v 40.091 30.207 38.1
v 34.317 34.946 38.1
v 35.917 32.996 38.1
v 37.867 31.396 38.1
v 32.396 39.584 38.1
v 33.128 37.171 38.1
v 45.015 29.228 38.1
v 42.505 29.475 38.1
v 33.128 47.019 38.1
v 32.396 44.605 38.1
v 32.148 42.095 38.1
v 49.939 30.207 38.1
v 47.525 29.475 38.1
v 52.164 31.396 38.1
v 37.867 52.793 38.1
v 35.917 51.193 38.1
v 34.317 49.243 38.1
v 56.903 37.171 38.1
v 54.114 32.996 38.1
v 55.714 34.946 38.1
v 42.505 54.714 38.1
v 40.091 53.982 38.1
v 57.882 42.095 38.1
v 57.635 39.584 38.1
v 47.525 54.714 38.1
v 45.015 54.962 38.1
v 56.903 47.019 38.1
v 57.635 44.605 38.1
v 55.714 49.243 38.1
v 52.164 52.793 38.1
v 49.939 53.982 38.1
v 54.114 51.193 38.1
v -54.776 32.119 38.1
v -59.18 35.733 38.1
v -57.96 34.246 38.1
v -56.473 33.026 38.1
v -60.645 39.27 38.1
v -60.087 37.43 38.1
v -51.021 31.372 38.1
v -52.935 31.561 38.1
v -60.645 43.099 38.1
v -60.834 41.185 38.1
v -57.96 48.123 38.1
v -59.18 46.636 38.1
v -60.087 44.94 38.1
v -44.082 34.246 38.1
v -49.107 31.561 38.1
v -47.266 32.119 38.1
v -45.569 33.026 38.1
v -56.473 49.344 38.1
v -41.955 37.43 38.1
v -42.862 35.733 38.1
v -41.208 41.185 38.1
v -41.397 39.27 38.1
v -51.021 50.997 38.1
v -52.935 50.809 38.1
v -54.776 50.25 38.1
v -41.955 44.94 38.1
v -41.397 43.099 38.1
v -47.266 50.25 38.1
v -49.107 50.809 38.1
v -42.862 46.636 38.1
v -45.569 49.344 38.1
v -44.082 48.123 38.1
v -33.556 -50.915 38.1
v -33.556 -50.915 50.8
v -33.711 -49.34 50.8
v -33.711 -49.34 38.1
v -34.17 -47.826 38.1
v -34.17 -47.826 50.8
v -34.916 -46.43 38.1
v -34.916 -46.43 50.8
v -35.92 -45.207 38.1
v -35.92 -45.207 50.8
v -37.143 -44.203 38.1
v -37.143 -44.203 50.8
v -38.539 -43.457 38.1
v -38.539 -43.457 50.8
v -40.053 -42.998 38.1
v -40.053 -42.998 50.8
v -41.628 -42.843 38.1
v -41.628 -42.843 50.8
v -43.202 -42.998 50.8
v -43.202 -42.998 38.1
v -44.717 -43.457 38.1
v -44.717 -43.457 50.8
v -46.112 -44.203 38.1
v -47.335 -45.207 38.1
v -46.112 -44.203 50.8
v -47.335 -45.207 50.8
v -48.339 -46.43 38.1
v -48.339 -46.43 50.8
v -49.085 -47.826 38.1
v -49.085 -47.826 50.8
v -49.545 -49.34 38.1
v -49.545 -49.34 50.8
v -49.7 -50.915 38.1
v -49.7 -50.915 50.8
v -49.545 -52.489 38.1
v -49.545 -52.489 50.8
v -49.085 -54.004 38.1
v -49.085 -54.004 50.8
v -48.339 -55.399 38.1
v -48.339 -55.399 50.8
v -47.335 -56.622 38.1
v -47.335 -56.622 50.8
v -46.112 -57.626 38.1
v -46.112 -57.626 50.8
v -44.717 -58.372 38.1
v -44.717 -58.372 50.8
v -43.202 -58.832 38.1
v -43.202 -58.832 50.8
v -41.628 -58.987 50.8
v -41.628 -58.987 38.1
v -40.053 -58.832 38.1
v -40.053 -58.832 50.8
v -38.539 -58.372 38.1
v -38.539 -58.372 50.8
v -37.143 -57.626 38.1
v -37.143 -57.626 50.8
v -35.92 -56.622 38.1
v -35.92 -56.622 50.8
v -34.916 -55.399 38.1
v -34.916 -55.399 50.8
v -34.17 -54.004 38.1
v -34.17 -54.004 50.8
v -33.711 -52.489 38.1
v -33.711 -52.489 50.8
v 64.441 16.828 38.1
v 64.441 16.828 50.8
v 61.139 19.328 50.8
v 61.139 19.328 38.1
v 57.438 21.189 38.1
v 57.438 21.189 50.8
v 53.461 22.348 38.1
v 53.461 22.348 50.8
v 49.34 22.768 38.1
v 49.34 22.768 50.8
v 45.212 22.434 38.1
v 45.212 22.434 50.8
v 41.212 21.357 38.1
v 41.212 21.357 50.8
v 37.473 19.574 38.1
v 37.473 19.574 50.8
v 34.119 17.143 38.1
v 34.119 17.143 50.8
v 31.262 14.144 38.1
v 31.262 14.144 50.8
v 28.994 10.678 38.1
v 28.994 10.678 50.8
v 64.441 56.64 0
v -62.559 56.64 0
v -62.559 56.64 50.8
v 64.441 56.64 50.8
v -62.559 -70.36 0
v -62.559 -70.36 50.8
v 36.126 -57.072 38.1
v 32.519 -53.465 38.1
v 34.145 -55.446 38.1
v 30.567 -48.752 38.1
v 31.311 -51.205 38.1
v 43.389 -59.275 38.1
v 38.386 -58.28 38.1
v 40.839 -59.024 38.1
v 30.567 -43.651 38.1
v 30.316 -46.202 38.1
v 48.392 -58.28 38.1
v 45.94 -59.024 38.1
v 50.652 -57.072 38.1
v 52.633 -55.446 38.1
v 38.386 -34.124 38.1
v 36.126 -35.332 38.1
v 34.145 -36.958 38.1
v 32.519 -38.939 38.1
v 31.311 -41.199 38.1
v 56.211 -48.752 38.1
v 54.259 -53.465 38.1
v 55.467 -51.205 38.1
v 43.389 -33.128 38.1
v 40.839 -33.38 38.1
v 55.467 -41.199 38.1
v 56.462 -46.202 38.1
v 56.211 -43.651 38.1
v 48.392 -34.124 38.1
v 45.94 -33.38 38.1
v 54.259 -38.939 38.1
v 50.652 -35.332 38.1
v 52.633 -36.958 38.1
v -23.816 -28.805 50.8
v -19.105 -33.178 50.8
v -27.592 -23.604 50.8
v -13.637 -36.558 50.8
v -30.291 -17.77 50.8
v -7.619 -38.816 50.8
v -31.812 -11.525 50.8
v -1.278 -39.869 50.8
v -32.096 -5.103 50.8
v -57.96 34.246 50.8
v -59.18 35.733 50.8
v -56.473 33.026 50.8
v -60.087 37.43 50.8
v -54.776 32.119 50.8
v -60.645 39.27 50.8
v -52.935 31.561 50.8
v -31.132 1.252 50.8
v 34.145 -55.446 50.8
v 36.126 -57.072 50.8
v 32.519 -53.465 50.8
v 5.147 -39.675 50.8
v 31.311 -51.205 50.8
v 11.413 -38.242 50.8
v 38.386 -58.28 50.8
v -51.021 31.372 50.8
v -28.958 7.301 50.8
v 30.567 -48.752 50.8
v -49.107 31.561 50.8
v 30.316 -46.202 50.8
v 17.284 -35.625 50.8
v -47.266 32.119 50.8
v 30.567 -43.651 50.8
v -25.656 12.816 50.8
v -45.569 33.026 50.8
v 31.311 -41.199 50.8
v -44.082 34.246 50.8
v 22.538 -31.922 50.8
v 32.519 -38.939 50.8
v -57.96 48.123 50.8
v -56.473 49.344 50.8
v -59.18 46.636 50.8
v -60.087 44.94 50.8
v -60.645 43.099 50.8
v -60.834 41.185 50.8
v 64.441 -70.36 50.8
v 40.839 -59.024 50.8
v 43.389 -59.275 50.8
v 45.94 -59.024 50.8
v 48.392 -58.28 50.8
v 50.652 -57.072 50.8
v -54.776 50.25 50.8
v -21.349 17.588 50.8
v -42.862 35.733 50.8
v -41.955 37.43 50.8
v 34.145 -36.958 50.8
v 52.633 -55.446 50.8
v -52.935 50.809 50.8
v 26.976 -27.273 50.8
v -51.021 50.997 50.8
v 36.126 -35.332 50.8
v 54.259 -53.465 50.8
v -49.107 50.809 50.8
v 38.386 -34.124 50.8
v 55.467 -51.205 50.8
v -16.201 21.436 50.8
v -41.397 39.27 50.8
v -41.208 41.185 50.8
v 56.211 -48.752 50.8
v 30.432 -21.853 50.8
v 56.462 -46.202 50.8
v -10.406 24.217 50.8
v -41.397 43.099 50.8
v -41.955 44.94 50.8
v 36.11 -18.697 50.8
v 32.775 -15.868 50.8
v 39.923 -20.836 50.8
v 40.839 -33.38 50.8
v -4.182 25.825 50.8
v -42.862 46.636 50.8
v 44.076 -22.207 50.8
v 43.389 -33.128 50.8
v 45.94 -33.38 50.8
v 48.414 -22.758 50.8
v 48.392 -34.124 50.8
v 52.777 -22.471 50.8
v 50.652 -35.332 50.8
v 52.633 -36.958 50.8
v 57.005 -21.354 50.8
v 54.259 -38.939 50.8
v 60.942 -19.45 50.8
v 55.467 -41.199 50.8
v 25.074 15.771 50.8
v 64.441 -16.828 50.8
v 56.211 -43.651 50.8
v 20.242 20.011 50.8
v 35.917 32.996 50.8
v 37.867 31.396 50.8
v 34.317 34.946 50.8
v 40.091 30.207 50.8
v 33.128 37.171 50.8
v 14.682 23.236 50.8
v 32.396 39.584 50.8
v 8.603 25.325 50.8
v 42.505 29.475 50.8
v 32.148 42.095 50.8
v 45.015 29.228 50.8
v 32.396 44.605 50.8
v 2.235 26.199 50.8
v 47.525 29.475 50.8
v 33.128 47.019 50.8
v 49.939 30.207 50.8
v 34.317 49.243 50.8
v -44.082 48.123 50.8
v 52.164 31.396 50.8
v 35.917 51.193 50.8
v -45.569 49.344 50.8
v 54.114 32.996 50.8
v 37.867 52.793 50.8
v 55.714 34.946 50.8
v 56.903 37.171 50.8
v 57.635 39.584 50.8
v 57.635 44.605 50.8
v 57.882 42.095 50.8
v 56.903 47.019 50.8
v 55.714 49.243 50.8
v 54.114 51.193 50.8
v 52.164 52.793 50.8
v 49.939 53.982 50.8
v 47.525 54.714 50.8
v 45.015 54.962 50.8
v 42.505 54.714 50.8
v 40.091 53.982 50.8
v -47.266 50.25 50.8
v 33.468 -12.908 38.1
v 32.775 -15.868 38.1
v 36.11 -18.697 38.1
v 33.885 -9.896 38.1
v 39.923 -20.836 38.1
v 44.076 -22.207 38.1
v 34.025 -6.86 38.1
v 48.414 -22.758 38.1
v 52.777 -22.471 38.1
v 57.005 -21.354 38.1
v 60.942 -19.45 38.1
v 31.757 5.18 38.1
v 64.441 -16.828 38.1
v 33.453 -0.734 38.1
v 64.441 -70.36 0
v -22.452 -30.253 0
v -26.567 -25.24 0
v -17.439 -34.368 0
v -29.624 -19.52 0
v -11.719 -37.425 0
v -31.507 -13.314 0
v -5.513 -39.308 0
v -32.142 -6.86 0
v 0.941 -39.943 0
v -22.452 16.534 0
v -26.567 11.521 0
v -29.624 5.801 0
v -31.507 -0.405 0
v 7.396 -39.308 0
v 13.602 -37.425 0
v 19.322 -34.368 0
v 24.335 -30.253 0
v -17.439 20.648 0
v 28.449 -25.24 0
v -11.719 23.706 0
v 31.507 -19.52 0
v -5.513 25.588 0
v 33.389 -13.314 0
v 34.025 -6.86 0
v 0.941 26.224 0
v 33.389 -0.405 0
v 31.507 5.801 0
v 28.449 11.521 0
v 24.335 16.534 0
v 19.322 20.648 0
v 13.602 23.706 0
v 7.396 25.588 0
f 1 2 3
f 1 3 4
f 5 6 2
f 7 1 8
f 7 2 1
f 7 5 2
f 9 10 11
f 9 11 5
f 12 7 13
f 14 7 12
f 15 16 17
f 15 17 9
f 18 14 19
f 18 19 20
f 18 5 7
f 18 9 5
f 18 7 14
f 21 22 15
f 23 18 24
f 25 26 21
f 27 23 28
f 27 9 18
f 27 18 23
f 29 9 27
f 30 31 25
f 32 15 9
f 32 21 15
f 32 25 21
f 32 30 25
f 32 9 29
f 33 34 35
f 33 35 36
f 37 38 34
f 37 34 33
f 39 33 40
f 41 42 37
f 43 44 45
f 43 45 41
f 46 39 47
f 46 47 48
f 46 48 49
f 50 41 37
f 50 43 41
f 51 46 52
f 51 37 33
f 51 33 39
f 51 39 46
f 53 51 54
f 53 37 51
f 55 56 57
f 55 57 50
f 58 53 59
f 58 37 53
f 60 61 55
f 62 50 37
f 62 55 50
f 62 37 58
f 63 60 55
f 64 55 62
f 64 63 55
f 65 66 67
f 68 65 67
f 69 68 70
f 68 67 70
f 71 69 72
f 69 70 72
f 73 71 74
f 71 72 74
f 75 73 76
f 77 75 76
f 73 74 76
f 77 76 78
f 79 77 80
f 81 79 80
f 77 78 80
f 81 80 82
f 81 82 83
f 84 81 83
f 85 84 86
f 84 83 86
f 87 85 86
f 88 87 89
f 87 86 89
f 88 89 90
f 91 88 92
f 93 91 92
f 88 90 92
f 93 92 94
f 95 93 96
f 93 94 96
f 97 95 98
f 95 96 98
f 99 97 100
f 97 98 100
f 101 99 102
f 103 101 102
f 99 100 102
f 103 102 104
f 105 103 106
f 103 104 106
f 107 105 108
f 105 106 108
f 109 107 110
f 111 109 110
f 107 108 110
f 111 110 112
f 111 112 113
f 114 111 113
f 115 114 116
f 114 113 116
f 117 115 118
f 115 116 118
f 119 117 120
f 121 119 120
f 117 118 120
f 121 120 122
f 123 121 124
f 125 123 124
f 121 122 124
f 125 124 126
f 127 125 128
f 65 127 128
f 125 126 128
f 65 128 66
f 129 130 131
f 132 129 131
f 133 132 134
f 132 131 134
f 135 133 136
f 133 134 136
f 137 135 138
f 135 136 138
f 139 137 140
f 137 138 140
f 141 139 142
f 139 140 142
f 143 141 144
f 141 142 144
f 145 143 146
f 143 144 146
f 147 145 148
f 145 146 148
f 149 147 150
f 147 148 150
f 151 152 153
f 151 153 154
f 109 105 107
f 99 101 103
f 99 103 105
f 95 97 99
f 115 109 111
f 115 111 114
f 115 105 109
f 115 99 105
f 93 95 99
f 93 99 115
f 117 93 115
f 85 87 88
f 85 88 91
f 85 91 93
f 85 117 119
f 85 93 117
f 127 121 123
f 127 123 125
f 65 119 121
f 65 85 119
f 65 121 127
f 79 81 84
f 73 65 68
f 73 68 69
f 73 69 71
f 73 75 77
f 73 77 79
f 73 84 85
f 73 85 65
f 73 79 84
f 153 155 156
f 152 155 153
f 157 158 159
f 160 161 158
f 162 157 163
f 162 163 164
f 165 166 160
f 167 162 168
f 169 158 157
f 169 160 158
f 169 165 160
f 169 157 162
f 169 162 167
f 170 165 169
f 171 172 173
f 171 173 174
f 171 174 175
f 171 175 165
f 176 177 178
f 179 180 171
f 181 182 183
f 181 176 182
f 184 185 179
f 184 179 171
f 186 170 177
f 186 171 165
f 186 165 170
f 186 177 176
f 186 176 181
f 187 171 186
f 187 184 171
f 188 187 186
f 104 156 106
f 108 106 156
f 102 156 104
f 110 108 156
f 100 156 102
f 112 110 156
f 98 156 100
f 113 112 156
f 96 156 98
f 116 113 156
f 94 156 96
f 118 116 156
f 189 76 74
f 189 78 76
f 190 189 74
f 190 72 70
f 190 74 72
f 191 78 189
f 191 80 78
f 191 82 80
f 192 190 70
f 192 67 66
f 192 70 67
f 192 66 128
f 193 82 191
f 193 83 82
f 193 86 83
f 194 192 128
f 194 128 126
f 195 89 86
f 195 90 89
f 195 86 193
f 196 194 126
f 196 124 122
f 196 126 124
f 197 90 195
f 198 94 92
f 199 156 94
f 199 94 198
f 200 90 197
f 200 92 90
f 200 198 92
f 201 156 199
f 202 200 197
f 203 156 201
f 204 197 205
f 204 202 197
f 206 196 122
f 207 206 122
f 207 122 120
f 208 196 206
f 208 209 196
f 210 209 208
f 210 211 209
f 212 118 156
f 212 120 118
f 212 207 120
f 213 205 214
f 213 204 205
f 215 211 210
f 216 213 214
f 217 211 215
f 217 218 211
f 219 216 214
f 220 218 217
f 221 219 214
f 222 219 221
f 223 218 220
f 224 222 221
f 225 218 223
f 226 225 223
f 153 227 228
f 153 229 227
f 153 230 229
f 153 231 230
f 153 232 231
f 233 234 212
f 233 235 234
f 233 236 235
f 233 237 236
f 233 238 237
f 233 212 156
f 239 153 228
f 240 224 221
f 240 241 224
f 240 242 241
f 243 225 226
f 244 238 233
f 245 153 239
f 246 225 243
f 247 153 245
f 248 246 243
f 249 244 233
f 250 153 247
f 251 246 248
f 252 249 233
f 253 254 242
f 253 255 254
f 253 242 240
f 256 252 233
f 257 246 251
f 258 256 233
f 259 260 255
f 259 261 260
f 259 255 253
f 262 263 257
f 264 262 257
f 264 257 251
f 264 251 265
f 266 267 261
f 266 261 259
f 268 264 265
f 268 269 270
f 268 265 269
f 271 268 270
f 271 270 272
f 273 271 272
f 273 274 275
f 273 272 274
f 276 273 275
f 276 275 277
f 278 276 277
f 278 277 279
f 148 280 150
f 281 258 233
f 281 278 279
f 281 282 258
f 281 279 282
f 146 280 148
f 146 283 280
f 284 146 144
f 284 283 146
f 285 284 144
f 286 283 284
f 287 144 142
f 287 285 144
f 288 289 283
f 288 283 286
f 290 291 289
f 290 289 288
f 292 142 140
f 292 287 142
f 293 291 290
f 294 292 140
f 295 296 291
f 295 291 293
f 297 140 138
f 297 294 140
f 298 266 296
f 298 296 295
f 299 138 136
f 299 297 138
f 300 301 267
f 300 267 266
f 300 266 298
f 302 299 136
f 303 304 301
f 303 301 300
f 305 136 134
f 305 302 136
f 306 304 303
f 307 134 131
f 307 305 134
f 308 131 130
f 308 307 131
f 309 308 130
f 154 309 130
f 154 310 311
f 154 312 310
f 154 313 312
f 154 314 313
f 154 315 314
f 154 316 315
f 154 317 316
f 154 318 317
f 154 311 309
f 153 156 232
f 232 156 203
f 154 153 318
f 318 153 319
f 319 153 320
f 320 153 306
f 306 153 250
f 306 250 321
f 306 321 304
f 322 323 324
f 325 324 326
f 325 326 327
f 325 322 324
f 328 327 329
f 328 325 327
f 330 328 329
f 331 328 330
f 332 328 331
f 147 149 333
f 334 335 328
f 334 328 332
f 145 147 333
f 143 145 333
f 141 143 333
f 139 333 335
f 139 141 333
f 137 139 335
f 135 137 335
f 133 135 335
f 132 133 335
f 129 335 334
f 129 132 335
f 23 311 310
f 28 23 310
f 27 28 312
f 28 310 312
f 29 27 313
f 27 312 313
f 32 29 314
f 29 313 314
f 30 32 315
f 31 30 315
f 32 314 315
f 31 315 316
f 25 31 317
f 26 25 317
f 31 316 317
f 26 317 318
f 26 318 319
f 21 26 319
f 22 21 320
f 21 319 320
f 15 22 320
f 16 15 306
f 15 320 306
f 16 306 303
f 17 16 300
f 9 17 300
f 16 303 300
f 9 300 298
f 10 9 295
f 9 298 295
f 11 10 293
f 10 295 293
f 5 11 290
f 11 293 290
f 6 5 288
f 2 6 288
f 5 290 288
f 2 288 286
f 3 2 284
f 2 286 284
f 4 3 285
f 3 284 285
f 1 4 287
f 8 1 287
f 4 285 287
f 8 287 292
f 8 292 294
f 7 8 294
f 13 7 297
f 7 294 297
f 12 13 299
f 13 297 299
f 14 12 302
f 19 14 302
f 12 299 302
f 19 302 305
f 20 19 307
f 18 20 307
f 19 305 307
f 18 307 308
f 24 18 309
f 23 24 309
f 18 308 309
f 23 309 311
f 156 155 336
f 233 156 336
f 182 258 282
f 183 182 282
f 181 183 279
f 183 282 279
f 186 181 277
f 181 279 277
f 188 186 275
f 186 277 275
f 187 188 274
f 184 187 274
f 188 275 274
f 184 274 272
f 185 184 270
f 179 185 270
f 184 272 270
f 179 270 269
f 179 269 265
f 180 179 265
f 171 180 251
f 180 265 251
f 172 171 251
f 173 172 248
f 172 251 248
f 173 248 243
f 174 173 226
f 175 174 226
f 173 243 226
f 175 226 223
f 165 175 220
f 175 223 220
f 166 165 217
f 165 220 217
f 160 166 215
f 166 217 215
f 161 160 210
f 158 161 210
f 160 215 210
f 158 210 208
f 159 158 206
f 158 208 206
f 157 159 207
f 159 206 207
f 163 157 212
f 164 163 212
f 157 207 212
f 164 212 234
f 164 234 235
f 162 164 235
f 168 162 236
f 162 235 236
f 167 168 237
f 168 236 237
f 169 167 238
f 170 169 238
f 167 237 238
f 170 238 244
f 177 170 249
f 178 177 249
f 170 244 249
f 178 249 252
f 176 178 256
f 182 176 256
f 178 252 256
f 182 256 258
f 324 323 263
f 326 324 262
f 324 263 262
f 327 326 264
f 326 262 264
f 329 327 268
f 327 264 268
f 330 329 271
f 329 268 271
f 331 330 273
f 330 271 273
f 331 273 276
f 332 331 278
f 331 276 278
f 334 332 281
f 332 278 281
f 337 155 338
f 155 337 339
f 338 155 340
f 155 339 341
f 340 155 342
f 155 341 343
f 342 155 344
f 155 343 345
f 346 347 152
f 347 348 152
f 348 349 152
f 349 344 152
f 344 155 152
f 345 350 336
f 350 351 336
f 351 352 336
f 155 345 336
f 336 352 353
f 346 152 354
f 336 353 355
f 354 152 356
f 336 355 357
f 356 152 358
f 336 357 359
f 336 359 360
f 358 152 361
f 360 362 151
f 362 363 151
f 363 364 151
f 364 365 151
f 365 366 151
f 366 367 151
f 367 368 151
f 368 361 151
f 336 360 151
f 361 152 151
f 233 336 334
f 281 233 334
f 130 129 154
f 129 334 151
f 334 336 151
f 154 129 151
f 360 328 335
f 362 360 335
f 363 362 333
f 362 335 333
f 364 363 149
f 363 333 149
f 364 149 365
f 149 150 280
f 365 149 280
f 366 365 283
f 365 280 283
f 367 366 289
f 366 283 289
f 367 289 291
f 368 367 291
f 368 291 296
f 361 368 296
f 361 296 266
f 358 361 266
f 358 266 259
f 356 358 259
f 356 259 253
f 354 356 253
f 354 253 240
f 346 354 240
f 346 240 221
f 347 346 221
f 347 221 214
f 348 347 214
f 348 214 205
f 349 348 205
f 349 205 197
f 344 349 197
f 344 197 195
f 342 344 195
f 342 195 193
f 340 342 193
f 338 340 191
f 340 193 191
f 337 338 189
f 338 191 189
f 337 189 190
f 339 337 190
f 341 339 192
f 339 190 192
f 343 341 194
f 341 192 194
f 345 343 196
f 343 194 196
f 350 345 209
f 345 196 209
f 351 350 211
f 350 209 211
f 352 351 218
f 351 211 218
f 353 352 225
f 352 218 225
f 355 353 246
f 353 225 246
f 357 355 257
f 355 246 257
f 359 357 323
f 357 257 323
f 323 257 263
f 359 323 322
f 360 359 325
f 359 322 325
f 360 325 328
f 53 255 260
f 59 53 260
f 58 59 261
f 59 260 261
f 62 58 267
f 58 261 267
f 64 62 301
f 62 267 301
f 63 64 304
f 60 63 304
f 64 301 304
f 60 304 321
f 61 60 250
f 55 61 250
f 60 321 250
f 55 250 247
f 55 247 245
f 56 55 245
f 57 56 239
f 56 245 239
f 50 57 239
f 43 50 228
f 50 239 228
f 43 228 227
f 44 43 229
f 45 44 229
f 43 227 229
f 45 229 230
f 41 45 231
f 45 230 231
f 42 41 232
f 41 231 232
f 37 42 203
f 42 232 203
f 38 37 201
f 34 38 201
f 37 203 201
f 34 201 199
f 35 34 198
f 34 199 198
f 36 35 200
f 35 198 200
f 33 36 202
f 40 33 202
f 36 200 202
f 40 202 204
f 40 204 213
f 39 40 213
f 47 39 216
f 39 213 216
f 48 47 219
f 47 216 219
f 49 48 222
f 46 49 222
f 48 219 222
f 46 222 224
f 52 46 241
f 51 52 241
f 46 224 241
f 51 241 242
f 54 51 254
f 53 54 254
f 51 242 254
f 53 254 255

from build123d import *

# Parameters (mm, degrees)
F0_W     = 127
F0_H     = 127
F1_DEPTH = 50.8
F2_R     = 33.083677
F3_DEPTH = 50.801
F4_R     = 9.812618
F4_R_2   = 12.86692
F4_R_3   = 8.071965
F4_R_4   = 13.073277
F4_R_5   = 22.768833
F5_DEPTH = 12.7


with BuildPart() as f1:
    # F0 (on Top) → F1 (new body)
    with BuildSketch(Plane.XY):
        with Locations((0.94142, -6.859615)):
            Rectangle(F0_W, F0_H)
    extrude(amount=F1_DEPTH)

    # F2 (on face) → F3 (cut, through all)
    with BuildSketch(Plane.XY.offset(50.8)):
        with Locations((0.94142, -6.859615)):
            Circle(F2_R)
    extrude(amount=-F3_DEPTH, mode=Mode.SUBTRACT)

    # F4 (on face) → F5 (cut)
    with BuildSketch(Plane.XY.offset(50.8)):
        with Locations((-51.02095, 41.184627)):
            Circle(F4_R)
        with Locations((45.015216, 42.094678)):
            Circle(F4_R_2)
        with Locations((-41.62769, -50.914697)):
            Circle(F4_R_3)
        with Locations((43.389134, -46.201754)):
            Circle(F4_R_4)
        with Locations((49.104106, 0)):
            Circle(F4_R_5)
    extrude(amount=-F5_DEPTH, mode=Mode.SUBTRACT)


solid = f1.part
